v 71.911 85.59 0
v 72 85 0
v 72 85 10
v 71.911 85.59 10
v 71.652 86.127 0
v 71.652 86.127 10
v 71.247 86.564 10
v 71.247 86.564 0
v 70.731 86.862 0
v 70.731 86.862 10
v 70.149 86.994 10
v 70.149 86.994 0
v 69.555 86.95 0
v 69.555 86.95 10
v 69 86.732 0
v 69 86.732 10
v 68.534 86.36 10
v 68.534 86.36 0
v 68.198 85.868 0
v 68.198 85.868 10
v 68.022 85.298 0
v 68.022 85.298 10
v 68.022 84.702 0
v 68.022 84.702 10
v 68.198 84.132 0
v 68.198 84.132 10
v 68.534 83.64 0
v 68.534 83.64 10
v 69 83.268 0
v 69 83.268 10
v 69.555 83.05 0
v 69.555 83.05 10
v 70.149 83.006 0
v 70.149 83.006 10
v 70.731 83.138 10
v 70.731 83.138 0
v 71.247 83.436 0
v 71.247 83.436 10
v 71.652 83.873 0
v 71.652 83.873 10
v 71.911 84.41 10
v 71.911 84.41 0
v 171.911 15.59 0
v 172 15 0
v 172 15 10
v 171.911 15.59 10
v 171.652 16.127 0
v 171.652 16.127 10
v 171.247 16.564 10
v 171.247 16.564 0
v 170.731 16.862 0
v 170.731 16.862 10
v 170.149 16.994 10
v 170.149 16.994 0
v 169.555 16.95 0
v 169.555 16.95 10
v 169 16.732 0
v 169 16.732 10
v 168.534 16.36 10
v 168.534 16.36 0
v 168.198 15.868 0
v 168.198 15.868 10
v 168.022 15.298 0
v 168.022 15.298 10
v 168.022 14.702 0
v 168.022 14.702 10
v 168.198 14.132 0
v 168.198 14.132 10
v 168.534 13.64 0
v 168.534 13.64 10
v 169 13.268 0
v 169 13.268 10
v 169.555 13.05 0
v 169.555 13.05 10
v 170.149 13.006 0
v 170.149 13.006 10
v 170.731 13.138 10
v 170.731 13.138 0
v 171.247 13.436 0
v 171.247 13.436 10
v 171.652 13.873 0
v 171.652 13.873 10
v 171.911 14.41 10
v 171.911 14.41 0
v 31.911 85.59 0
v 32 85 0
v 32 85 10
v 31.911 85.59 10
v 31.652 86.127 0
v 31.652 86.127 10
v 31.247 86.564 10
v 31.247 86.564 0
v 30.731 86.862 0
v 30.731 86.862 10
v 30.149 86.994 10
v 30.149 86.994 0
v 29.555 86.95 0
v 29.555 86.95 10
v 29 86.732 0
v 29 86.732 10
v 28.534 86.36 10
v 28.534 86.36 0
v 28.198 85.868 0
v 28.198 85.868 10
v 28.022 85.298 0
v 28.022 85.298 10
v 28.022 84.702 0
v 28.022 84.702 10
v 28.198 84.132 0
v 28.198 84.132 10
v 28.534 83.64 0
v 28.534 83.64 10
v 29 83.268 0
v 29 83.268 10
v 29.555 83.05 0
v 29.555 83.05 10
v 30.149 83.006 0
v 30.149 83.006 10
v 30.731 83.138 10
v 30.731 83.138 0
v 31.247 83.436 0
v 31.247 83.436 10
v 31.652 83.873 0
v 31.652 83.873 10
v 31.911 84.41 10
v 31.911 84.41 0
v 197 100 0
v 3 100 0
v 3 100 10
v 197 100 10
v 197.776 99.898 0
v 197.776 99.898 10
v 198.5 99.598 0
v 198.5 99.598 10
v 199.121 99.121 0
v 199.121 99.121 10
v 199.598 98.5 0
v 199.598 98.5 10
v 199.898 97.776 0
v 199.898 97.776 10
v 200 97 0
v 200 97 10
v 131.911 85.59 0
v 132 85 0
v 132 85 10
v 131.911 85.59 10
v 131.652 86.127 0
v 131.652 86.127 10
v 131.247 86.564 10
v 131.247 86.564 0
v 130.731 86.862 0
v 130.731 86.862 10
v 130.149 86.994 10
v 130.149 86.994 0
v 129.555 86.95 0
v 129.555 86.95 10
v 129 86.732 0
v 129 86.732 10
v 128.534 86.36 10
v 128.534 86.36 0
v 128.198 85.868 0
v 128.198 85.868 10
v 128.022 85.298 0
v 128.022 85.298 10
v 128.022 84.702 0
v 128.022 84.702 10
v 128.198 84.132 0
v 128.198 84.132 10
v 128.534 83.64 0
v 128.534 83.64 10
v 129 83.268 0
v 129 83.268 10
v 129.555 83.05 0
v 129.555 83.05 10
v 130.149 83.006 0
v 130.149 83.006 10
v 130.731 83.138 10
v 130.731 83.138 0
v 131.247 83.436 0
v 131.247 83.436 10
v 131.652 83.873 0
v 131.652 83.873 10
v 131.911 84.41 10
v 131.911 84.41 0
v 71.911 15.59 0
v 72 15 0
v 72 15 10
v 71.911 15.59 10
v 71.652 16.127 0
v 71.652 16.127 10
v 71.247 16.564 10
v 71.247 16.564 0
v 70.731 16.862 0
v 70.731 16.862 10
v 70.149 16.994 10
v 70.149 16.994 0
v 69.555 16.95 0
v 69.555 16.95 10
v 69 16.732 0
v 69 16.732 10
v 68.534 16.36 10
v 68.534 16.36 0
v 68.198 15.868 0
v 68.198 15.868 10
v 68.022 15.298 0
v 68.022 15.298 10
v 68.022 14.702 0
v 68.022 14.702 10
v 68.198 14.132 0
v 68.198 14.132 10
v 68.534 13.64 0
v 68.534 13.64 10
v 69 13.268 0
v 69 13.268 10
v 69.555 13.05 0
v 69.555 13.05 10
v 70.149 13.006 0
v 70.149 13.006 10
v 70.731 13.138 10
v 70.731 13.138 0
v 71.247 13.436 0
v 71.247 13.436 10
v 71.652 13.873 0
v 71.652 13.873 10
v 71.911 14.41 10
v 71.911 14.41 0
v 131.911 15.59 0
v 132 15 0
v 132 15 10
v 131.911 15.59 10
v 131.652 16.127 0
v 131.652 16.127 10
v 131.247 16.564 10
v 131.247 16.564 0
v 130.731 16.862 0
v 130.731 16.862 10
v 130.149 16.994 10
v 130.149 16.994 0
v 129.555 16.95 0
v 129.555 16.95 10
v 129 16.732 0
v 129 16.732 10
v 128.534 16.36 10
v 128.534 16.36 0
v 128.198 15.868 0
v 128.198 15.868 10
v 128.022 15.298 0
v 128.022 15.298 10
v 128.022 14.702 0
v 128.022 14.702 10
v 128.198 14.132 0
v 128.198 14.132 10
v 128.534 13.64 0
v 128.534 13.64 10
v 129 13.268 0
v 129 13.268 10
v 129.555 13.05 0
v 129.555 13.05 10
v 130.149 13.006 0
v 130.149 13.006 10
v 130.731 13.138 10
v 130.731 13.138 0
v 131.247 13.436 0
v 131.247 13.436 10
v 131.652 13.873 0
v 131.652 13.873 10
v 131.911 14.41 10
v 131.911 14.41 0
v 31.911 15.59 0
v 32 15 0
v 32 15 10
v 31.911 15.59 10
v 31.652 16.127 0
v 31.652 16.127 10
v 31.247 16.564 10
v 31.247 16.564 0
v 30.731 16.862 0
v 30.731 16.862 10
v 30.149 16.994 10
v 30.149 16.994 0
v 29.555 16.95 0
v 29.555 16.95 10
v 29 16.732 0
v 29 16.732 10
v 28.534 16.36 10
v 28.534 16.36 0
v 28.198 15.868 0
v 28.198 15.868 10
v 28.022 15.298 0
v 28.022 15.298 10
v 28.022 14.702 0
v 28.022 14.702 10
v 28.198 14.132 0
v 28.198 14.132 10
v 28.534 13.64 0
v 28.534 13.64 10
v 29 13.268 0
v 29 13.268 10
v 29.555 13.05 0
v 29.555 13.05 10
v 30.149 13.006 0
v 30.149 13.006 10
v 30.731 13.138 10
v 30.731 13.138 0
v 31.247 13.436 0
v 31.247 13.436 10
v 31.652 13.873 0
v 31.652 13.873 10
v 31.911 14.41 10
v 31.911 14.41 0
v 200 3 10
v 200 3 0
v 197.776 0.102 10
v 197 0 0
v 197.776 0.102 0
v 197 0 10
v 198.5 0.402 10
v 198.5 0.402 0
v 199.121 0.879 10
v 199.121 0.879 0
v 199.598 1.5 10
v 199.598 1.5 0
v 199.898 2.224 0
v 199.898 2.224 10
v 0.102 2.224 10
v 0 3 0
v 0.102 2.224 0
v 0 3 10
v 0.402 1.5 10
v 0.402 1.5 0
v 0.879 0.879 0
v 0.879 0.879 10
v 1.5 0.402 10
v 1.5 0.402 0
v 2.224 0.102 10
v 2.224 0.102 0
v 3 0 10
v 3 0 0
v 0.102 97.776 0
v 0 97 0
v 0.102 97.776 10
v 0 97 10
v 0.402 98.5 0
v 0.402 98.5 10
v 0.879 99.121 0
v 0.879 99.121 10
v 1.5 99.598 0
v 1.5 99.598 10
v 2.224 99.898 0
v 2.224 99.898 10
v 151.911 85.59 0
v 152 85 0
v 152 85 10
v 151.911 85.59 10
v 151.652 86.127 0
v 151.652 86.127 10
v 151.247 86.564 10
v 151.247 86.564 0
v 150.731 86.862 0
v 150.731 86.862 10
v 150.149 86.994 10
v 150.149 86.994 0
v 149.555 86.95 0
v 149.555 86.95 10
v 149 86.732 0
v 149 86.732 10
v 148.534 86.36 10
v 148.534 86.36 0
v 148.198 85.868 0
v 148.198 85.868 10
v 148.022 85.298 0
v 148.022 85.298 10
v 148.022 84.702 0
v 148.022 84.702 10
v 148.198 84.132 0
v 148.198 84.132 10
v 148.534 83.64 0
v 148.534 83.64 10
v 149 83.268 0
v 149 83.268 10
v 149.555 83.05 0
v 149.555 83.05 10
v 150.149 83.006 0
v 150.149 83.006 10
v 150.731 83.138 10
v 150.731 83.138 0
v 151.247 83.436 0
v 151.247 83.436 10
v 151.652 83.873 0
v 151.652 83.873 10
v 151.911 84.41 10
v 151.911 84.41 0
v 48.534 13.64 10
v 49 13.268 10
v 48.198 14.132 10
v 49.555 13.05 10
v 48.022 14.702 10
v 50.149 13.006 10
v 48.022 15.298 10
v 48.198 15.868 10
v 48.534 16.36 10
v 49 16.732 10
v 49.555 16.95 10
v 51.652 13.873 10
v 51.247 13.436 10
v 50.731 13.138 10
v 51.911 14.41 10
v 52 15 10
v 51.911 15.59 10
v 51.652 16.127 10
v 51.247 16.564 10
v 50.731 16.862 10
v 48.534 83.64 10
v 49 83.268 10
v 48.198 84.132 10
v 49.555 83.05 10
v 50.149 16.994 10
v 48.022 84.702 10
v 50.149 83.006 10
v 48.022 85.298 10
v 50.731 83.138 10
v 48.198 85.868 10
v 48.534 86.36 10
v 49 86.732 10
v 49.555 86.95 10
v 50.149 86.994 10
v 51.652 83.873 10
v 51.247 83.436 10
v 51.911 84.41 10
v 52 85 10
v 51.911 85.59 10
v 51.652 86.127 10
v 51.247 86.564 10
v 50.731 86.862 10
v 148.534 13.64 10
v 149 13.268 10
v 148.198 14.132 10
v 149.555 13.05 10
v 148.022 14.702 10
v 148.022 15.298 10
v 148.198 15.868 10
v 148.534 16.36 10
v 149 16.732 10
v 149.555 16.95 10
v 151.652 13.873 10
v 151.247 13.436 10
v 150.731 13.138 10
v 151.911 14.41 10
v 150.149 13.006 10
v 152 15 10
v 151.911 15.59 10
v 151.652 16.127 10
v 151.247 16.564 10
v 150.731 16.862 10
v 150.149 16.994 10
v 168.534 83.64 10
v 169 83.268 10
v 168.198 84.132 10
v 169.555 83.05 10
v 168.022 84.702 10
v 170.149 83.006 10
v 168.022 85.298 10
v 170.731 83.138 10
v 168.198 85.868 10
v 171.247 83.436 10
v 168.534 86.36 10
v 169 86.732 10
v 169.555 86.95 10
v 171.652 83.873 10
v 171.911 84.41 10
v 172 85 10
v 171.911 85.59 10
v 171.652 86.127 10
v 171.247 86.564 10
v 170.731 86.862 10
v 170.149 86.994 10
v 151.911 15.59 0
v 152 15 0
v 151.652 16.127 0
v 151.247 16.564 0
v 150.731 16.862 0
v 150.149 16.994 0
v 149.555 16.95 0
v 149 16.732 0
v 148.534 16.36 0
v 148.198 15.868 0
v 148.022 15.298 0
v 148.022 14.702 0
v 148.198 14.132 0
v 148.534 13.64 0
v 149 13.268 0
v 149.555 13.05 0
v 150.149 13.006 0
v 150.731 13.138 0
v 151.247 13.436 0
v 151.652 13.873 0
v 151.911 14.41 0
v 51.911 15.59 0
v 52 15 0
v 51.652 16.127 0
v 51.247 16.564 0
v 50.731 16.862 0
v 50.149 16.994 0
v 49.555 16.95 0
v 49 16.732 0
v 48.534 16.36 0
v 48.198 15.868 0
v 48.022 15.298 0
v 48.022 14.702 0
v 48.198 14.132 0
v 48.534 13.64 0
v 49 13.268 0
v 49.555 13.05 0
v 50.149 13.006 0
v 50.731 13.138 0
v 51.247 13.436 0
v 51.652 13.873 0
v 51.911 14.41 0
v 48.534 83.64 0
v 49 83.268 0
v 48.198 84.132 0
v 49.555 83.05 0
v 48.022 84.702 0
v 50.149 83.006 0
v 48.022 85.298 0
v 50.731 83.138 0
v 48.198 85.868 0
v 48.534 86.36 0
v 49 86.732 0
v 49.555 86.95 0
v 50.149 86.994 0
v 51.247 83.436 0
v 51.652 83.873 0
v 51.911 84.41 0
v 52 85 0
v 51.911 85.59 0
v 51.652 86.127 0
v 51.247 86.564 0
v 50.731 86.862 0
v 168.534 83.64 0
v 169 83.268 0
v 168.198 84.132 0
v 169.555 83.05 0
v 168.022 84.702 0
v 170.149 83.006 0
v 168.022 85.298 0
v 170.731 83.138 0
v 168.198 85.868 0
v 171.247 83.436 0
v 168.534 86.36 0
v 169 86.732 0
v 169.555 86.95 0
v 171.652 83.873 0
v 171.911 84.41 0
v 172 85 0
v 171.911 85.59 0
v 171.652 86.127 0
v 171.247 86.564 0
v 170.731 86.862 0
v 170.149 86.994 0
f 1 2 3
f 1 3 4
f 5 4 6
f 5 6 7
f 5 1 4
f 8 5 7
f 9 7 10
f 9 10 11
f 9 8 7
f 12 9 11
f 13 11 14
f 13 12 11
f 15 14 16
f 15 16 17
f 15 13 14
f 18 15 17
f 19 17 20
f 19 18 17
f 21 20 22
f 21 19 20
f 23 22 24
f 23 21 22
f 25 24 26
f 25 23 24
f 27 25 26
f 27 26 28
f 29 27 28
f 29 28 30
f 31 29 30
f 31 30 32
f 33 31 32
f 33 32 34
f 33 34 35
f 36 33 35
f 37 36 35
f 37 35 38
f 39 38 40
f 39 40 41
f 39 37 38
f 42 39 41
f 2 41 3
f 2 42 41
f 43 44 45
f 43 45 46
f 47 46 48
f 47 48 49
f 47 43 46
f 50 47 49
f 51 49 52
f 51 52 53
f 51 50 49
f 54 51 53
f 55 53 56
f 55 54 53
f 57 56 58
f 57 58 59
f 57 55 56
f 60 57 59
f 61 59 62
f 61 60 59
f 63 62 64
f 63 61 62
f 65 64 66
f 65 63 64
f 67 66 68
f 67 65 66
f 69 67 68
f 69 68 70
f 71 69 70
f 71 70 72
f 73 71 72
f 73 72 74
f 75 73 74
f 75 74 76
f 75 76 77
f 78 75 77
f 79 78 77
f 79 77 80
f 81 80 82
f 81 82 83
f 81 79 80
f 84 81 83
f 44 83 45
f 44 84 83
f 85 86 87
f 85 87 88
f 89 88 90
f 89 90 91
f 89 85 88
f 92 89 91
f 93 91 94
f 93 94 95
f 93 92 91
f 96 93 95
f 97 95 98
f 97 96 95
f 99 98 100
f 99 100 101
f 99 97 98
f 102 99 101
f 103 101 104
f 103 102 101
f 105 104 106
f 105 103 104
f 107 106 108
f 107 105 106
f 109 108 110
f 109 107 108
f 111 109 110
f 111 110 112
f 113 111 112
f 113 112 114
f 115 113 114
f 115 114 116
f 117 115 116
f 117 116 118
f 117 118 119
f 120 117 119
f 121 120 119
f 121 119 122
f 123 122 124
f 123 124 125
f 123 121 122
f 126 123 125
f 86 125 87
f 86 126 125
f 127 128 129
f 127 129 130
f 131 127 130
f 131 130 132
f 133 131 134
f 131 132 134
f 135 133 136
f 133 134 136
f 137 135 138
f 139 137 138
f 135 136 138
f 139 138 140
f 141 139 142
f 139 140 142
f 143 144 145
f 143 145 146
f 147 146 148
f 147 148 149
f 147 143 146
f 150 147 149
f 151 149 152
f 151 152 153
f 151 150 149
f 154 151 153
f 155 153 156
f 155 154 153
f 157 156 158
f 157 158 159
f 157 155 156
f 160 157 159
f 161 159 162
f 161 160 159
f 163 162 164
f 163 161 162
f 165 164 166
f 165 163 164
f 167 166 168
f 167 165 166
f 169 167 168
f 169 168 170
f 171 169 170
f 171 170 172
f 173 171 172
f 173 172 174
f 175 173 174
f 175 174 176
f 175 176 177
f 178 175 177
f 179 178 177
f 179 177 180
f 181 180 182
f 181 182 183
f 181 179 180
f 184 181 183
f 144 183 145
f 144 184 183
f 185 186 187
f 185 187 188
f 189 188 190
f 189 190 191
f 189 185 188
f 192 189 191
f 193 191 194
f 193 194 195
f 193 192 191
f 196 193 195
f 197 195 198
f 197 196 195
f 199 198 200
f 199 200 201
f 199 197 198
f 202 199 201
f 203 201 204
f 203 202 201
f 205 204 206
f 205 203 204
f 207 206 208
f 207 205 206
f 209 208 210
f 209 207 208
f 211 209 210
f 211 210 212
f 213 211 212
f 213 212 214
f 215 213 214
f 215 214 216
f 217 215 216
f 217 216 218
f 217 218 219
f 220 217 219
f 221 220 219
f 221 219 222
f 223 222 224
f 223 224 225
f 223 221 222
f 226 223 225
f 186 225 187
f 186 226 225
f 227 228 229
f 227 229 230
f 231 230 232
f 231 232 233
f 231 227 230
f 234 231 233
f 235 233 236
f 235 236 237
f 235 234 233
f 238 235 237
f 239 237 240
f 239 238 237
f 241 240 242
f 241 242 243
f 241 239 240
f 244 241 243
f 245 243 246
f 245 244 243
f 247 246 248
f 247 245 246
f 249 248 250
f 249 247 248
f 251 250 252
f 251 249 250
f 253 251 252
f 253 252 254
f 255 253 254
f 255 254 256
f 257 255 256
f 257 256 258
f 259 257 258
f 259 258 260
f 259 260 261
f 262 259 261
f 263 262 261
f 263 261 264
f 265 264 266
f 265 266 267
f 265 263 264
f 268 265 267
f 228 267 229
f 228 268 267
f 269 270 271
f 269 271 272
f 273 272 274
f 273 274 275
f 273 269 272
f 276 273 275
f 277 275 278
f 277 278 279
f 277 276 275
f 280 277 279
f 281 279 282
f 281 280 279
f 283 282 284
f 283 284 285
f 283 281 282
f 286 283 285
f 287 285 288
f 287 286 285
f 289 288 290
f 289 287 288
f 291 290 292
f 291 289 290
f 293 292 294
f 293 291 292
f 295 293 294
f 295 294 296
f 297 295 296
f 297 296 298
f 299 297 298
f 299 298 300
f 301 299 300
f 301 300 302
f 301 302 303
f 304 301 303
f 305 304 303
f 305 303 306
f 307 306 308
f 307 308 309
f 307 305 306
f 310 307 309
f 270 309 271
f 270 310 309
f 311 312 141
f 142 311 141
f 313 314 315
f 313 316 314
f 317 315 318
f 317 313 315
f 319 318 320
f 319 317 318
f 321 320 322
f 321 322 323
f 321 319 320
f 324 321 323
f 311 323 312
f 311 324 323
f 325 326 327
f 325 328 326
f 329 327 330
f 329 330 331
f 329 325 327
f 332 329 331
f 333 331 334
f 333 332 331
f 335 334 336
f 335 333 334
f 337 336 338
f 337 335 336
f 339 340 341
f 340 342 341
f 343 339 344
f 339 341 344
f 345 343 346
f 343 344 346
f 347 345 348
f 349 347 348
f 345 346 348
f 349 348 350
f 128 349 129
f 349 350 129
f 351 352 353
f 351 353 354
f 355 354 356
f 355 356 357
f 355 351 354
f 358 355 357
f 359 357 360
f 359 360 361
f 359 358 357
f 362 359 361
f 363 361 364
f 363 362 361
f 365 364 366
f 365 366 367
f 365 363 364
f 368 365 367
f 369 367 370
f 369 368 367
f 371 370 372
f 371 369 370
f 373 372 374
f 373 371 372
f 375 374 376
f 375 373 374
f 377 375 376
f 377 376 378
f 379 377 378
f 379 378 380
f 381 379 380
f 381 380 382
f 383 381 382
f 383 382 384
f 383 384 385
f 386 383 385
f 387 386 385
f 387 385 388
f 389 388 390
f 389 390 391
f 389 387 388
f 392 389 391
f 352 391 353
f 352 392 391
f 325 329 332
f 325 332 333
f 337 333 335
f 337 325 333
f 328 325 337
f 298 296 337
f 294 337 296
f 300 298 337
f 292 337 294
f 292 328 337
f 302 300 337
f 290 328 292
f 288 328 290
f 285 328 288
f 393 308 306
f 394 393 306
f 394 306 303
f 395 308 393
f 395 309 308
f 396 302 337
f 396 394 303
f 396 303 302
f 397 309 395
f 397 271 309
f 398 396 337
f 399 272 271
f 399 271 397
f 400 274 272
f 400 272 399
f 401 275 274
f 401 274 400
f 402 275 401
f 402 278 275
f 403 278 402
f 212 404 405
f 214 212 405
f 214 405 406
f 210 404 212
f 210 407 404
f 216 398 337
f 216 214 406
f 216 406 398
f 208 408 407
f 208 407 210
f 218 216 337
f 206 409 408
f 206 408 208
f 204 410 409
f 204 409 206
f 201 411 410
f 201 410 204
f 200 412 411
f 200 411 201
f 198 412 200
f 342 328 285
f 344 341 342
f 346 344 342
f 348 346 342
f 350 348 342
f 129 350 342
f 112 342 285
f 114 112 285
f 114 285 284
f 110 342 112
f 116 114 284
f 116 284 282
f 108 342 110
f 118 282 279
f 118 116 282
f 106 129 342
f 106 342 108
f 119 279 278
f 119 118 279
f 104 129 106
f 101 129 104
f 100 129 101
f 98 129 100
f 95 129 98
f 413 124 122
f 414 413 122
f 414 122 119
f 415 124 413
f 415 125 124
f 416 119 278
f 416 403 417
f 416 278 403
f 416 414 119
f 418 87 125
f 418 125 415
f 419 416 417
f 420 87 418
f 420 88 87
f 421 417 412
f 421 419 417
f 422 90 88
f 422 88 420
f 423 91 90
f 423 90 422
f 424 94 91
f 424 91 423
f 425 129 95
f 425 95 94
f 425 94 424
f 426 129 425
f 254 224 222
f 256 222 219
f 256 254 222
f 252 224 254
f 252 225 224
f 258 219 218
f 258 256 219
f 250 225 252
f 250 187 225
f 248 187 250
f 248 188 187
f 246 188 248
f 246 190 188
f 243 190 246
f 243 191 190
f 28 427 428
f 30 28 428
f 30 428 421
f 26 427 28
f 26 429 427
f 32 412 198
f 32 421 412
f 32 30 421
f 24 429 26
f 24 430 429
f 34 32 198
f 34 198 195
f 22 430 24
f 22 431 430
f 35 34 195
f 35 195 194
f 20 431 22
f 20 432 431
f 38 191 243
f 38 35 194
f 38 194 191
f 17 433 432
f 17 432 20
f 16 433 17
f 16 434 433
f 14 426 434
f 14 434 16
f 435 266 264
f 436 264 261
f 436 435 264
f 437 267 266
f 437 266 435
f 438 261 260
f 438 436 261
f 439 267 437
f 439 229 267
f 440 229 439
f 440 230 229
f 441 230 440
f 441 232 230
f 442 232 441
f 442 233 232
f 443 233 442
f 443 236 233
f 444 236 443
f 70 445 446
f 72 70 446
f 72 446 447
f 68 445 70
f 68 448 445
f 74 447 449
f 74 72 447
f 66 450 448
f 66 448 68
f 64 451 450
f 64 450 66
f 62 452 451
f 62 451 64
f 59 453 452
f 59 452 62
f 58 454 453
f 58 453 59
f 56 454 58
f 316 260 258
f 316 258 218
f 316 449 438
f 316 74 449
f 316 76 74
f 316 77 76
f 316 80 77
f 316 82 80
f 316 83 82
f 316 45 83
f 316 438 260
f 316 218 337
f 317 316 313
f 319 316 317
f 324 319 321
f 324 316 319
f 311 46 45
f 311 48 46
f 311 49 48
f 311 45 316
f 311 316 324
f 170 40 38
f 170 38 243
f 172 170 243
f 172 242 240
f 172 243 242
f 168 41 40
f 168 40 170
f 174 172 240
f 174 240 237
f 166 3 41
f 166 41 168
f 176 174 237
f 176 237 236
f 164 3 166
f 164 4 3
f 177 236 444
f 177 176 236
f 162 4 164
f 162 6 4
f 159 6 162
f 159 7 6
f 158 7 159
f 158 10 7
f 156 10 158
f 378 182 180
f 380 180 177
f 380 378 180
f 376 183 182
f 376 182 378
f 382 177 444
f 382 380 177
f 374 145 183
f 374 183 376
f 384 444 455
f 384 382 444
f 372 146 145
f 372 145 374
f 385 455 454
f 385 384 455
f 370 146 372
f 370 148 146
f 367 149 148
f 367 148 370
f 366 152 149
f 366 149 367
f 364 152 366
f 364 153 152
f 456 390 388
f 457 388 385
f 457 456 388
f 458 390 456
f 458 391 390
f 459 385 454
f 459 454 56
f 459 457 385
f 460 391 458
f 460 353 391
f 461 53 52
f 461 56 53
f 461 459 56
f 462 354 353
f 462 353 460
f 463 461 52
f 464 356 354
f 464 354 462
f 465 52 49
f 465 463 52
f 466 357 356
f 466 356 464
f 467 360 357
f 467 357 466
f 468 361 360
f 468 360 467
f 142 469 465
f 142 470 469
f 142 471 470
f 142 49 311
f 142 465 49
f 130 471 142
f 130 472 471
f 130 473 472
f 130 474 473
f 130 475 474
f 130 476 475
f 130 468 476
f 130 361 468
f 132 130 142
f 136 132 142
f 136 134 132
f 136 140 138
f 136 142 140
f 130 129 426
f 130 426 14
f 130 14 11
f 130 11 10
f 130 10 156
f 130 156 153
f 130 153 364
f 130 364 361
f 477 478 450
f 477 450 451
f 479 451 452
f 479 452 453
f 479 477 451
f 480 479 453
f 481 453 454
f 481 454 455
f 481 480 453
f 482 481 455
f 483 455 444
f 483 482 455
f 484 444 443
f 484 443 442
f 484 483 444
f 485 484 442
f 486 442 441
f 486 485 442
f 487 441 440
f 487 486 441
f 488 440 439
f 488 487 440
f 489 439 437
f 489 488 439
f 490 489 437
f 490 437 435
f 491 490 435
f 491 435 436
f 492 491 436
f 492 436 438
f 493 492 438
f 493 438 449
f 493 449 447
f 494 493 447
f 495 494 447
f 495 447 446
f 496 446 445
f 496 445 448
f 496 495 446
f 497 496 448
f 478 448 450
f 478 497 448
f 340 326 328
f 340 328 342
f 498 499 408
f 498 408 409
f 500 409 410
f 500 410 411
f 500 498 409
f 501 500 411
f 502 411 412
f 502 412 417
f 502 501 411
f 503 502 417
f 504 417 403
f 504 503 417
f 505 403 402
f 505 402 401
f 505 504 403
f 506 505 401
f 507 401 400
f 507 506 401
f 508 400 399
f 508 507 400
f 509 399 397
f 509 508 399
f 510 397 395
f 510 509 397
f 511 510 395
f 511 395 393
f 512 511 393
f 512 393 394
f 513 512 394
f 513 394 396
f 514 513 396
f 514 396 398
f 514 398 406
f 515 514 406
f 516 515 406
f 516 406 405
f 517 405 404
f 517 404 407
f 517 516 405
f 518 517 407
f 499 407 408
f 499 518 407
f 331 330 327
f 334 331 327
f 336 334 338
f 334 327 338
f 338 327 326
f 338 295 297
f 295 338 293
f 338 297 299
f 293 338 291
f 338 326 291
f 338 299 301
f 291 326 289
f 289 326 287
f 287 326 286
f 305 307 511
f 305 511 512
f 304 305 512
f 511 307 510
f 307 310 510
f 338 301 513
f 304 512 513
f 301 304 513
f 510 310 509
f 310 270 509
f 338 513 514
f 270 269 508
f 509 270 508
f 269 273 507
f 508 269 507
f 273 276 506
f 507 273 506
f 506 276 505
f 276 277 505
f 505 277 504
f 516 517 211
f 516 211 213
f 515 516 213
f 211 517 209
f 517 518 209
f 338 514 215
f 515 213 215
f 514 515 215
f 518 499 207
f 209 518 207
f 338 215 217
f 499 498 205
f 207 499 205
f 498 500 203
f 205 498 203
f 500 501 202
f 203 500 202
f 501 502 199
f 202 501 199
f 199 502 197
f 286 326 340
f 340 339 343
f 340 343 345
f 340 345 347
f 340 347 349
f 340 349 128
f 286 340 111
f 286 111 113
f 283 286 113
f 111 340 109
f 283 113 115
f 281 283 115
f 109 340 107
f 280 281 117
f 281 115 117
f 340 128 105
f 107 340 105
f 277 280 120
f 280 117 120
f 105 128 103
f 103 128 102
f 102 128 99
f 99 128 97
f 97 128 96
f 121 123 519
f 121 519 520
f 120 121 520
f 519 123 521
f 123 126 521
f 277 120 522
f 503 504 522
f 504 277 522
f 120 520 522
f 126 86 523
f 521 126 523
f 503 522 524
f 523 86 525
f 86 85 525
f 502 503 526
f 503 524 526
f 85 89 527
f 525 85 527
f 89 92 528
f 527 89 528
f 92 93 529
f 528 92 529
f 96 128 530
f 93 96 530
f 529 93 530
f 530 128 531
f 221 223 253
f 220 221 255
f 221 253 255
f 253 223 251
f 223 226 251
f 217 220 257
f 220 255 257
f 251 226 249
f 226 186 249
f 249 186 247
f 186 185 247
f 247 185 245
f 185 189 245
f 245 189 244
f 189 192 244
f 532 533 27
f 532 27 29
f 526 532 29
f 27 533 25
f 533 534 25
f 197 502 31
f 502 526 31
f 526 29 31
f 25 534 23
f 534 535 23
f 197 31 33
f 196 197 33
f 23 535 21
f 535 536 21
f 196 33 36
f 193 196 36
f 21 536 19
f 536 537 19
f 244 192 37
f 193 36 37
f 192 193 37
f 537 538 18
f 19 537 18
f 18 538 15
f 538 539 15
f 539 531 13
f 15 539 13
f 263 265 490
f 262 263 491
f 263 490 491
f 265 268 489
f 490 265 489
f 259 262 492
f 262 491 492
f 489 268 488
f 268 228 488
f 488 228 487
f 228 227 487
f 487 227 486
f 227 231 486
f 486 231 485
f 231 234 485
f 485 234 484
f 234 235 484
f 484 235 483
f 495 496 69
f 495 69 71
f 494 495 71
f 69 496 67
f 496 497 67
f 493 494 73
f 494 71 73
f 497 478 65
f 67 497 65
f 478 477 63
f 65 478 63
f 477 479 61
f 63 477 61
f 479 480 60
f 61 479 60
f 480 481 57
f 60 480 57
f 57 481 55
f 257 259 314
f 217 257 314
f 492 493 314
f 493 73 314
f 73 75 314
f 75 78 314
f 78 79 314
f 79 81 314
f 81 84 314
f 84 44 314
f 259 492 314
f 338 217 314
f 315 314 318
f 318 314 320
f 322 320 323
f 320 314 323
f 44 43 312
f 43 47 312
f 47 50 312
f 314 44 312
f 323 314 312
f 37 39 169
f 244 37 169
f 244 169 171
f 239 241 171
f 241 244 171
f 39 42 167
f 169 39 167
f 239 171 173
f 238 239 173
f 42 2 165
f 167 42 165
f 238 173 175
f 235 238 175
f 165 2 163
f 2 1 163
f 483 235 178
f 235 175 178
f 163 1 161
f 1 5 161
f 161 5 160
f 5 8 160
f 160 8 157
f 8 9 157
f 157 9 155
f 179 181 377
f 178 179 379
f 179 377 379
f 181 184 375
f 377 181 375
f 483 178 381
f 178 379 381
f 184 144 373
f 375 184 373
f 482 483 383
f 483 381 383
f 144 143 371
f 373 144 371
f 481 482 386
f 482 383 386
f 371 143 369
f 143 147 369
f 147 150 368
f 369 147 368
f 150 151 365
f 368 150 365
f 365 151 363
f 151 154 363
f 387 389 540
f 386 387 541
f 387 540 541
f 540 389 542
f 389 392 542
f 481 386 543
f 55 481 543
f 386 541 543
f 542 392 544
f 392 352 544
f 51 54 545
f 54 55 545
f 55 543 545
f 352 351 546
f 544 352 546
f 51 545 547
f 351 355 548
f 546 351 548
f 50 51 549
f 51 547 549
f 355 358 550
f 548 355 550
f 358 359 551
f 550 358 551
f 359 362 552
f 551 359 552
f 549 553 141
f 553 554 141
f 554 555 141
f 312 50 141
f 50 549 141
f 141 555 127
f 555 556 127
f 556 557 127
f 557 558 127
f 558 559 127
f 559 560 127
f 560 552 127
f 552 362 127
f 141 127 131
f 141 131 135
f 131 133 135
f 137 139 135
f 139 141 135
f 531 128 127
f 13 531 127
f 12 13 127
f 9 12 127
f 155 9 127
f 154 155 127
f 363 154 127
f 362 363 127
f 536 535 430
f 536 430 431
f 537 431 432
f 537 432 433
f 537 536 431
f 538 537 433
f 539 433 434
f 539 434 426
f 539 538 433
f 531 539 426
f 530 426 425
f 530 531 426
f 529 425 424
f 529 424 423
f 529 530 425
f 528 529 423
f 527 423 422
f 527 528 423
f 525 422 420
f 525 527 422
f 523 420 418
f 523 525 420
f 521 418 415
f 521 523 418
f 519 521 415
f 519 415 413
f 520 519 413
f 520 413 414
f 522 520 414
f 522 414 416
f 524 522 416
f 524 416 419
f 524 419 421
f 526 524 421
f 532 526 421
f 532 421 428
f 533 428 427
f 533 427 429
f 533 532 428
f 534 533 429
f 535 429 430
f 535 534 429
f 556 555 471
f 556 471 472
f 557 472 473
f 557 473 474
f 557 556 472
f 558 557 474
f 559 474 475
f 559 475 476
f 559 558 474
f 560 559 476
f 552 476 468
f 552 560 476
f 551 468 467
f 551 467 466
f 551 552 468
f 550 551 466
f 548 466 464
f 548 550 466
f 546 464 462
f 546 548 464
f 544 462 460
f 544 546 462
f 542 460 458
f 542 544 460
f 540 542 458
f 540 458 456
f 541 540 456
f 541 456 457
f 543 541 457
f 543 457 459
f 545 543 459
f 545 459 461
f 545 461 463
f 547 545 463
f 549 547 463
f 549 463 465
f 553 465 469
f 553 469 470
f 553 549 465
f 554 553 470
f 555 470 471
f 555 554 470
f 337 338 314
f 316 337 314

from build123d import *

# Parameters (mm, degrees)
SKETCH_W  = 200
SKETCH_H  = 100
SKETCH_R  = 2
PAD_DEPTH = 10
FILLET_R  = 3


with BuildPart() as part:
    # Sketch → Pad (new body)
    with BuildSketch(Plane.XY):
        with Locations((100, 50)):
            Rectangle(SKETCH_W, SKETCH_H)
        with Locations((30, 85)):
            Circle(SKETCH_R, mode=Mode.SUBTRACT)
        with Locations((30, 15)):
            Circle(SKETCH_R, mode=Mode.SUBTRACT)
        with Locations((170, 85)):
            Circle(SKETCH_R, mode=Mode.SUBTRACT)
        with Locations((170, 15)):
            Circle(SKETCH_R, mode=Mode.SUBTRACT)
        with Locations((50, 85)):
            Circle(SKETCH_R, mode=Mode.SUBTRACT)
        with Locations((50, 15)):
            Circle(SKETCH_R, mode=Mode.SUBTRACT)
        with Locations((150, 85)):
            Circle(SKETCH_R, mode=Mode.SUBTRACT)
        with Locations((150, 15)):
            Circle(SKETCH_R, mode=Mode.SUBTRACT)
        with Locations((70, 85)):
            Circle(SKETCH_R, mode=Mode.SUBTRACT)
        with Locations((70, 15)):
            Circle(SKETCH_R, mode=Mode.SUBTRACT)
        with Locations((130, 15)):
            Circle(SKETCH_R, mode=Mode.SUBTRACT)
        with Locations((130, 85)):
            Circle(SKETCH_R, mode=Mode.SUBTRACT)
    extrude(amount=PAD_DEPTH)

    # Fillet
    fillet_edges = [part.edges().sort_by_distance(p)[0] for p in [
        (200, 0, 5),
        (0, 0, 5),
        (200, 100, 5),
        (0, 100, 5),
    ]]
    fillet(fillet_edges, radius=FILLET_R)


solid = part.part
